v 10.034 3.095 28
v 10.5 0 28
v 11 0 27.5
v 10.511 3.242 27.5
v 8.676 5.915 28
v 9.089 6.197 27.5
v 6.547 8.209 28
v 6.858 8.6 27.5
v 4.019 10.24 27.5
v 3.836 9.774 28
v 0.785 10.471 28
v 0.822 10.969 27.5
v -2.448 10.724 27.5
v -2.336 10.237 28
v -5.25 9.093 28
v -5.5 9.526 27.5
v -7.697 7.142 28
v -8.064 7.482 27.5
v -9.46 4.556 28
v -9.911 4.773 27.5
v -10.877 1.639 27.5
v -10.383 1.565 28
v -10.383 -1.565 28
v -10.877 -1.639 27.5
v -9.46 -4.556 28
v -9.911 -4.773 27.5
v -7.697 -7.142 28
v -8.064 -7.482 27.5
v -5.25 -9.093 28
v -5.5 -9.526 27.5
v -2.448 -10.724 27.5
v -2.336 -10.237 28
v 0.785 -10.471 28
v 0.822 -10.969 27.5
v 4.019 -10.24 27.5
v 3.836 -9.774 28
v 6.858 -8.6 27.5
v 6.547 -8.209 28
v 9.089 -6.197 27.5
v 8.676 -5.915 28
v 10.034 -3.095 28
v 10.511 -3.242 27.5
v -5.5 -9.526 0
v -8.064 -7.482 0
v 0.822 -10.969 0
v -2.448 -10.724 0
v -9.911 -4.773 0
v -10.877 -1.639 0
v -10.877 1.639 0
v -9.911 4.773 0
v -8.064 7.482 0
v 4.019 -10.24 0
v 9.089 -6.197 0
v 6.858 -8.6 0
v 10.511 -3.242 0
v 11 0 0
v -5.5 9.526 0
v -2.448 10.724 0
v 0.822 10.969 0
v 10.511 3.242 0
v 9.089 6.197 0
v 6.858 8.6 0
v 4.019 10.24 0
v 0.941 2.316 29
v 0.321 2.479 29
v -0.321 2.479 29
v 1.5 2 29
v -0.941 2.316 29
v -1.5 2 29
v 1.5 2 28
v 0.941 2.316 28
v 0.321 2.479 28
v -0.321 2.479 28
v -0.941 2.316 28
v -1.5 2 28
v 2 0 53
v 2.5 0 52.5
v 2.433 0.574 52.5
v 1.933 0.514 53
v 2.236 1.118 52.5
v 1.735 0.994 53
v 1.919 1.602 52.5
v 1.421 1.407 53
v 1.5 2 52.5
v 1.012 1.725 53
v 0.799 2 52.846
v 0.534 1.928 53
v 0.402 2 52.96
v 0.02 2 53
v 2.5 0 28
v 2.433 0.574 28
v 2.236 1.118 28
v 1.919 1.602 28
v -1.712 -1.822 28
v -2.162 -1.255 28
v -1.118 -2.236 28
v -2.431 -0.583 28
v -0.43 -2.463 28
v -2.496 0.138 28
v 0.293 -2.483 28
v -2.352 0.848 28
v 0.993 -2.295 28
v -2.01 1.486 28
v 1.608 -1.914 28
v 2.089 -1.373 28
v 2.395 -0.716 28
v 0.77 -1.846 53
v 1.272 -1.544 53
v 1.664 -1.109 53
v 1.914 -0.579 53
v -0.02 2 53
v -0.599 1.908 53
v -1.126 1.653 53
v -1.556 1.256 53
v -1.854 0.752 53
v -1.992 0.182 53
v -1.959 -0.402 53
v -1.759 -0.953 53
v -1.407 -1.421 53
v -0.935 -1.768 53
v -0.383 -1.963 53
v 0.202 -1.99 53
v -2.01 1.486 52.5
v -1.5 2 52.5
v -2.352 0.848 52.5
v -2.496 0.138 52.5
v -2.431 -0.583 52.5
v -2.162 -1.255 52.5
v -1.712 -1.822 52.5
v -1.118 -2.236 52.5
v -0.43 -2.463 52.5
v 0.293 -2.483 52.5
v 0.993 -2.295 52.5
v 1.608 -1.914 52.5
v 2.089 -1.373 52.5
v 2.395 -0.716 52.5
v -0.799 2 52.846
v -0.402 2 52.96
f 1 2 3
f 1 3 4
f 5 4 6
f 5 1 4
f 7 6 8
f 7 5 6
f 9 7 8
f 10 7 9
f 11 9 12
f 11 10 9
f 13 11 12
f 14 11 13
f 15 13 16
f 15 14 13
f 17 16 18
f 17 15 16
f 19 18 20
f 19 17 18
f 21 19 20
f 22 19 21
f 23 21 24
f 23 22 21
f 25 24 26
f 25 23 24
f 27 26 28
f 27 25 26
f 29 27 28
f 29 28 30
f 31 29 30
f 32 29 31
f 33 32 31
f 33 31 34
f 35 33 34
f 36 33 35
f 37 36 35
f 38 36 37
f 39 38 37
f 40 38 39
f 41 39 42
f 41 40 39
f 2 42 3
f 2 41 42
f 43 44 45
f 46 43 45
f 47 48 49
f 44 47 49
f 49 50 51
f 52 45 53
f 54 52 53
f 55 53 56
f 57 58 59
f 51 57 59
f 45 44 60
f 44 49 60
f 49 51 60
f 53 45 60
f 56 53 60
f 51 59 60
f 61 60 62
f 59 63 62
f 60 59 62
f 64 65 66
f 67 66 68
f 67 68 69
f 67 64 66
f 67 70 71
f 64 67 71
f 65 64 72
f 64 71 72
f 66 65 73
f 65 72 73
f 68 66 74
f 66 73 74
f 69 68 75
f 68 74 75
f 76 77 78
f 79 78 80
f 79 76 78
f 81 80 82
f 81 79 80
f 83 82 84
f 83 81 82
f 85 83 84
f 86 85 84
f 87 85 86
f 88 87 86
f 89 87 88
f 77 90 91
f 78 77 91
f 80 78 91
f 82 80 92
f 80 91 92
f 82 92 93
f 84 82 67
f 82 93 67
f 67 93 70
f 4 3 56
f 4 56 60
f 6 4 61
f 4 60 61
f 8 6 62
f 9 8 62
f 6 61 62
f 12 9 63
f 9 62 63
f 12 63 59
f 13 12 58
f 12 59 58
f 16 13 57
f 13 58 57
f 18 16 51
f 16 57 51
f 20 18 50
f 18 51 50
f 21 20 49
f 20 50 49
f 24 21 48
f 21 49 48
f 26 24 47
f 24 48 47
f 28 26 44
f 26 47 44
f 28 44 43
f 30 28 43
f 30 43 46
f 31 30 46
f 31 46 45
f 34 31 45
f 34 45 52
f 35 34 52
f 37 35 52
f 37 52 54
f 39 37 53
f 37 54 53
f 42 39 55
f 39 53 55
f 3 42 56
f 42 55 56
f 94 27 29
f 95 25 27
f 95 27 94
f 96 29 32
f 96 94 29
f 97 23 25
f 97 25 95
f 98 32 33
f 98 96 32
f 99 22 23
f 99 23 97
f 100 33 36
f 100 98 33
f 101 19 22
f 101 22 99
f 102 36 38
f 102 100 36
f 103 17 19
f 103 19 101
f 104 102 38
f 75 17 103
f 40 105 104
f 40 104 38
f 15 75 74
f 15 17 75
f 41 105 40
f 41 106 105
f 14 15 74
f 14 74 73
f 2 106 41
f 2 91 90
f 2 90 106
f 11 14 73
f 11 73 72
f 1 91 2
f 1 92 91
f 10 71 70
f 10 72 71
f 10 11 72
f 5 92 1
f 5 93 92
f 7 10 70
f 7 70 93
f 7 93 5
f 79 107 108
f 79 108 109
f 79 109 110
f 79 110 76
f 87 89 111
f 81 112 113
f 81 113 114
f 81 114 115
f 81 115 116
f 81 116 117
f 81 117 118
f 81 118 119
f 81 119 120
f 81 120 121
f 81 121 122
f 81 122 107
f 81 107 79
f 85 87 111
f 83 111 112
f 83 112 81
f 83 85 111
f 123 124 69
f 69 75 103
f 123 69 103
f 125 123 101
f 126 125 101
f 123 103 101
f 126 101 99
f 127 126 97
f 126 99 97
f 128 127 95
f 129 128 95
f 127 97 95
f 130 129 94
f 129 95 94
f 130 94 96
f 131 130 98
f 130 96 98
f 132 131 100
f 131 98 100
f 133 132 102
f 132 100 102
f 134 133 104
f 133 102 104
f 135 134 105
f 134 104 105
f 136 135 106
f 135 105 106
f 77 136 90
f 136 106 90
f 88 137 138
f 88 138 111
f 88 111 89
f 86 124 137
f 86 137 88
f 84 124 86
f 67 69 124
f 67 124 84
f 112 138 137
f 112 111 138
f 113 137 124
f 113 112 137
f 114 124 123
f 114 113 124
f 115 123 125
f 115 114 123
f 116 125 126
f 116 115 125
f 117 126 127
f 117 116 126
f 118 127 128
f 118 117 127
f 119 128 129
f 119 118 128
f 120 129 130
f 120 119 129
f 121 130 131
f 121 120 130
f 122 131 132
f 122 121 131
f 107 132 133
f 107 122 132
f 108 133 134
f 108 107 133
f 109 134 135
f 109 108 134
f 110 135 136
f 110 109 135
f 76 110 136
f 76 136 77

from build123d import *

# Parameters (mm, degrees)
SKETCH1_R           = 11
SKETCH1_R_2         = 2.5
BOSS_EXTRUDE1_DEPTH = 28
BOSS_EXTRUDE2_START = 28
BOSS_EXTRUDE2_DEPTH = 25
CUT_EXTRUDE1_START  = 29
CUT_EXTRUDE1_DEPTH  = 24
CHAMFER1_SIZE       = 0.5


with BuildPart() as part:
    # Sketch1 → Boss-Extrude1 (new body)
    # profile 1 of 5: a face of its own
    with BuildSketch(Plane.XY):
        Circle(SKETCH1_R)
        Circle(SKETCH1_R_2, mode=Mode.SUBTRACT)
    # profile 2 of 5: a face of its own
    with BuildSketch(Plane.XY):
        with BuildLine():
            ThreePointArc((1.5, 2), (0, 2.5), (-1.5, 2))
            Line((-1.5, 2), (1.5, 2))
        make_face()
    # profile 3 of 5: a face of its own
    with BuildSketch(Plane.XY):
        with BuildLine():
            Line((1.5, 2), (-1.5, 2))
            ThreePointArc((-1.5, 2), (-1.118033989, -2.236067977), (2.5, 0))
            ThreePointArc((2.5, 0), (2.236067977, 1.118033989), (1.5, 2))
        make_face()
    # profile 4 of 5: a face of its own
    with BuildSketch(Plane.XY):
        with BuildLine():
            ThreePointArc((1.5, 2), (0, 2.5), (-1.5, 2))
            Line((-1.5, 2), (1.5, 2))
        make_face()
    # profile 5 of 5: a face of its own
    with BuildSketch(Plane.XY):
        with BuildLine():
            Line((1.5, 2), (-1.5, 2))
            ThreePointArc((-1.5, 2), (-1.118033989, -2.236067977), (2.5, 0))
            ThreePointArc((2.5, 0), (2.236067977, 1.118033989), (1.5, 2))
        make_face()
    extrude(amount=BOSS_EXTRUDE1_DEPTH)

    # Sketch1<3> → Boss-Extrude2 (add)
    with BuildSketch(Plane.XY.offset(BOSS_EXTRUDE2_START)):
        with BuildLine():
            ThreePointArc((1.5, 2), (0, 2.5), (-1.5, 2))
            Line((-1.5, 2), (1.5, 2))
        make_face()
        with BuildLine():
            Line((1.5, 2), (-1.5, 2))
            ThreePointArc((-1.5, 2), (-1.118033989, -2.236067977), (2.5, 0))
            ThreePointArc((2.5, 0), (2.236067977, 1.118033989), (1.5, 2))
        make_face()
    extrude(amount=BOSS_EXTRUDE2_DEPTH)

    # Sketch1<4> → Cut-Extrude1 (cut)
    with BuildSketch(Plane.XY.offset(CUT_EXTRUDE1_START)):
        with BuildLine():
            ThreePointArc((1.5, 2), (0, 2.5), (-1.5, 2))
            Line((-1.5, 2), (1.5, 2))
        make_face()
    extrude(amount=CUT_EXTRUDE1_DEPTH, mode=Mode.SUBTRACT)

    # Chamfer1
    chamfer1_edges = [part.edges().sort_by_distance(p)[0] for p in [
        (-11, 0, 28),
        (-1.118033989, -2.236067977, 53),
    ]]
    chamfer(chamfer1_edges, length=CHAMFER1_SIZE - 0.0001)  # a hair under: the kernel refuses the full size


solid = part.part
